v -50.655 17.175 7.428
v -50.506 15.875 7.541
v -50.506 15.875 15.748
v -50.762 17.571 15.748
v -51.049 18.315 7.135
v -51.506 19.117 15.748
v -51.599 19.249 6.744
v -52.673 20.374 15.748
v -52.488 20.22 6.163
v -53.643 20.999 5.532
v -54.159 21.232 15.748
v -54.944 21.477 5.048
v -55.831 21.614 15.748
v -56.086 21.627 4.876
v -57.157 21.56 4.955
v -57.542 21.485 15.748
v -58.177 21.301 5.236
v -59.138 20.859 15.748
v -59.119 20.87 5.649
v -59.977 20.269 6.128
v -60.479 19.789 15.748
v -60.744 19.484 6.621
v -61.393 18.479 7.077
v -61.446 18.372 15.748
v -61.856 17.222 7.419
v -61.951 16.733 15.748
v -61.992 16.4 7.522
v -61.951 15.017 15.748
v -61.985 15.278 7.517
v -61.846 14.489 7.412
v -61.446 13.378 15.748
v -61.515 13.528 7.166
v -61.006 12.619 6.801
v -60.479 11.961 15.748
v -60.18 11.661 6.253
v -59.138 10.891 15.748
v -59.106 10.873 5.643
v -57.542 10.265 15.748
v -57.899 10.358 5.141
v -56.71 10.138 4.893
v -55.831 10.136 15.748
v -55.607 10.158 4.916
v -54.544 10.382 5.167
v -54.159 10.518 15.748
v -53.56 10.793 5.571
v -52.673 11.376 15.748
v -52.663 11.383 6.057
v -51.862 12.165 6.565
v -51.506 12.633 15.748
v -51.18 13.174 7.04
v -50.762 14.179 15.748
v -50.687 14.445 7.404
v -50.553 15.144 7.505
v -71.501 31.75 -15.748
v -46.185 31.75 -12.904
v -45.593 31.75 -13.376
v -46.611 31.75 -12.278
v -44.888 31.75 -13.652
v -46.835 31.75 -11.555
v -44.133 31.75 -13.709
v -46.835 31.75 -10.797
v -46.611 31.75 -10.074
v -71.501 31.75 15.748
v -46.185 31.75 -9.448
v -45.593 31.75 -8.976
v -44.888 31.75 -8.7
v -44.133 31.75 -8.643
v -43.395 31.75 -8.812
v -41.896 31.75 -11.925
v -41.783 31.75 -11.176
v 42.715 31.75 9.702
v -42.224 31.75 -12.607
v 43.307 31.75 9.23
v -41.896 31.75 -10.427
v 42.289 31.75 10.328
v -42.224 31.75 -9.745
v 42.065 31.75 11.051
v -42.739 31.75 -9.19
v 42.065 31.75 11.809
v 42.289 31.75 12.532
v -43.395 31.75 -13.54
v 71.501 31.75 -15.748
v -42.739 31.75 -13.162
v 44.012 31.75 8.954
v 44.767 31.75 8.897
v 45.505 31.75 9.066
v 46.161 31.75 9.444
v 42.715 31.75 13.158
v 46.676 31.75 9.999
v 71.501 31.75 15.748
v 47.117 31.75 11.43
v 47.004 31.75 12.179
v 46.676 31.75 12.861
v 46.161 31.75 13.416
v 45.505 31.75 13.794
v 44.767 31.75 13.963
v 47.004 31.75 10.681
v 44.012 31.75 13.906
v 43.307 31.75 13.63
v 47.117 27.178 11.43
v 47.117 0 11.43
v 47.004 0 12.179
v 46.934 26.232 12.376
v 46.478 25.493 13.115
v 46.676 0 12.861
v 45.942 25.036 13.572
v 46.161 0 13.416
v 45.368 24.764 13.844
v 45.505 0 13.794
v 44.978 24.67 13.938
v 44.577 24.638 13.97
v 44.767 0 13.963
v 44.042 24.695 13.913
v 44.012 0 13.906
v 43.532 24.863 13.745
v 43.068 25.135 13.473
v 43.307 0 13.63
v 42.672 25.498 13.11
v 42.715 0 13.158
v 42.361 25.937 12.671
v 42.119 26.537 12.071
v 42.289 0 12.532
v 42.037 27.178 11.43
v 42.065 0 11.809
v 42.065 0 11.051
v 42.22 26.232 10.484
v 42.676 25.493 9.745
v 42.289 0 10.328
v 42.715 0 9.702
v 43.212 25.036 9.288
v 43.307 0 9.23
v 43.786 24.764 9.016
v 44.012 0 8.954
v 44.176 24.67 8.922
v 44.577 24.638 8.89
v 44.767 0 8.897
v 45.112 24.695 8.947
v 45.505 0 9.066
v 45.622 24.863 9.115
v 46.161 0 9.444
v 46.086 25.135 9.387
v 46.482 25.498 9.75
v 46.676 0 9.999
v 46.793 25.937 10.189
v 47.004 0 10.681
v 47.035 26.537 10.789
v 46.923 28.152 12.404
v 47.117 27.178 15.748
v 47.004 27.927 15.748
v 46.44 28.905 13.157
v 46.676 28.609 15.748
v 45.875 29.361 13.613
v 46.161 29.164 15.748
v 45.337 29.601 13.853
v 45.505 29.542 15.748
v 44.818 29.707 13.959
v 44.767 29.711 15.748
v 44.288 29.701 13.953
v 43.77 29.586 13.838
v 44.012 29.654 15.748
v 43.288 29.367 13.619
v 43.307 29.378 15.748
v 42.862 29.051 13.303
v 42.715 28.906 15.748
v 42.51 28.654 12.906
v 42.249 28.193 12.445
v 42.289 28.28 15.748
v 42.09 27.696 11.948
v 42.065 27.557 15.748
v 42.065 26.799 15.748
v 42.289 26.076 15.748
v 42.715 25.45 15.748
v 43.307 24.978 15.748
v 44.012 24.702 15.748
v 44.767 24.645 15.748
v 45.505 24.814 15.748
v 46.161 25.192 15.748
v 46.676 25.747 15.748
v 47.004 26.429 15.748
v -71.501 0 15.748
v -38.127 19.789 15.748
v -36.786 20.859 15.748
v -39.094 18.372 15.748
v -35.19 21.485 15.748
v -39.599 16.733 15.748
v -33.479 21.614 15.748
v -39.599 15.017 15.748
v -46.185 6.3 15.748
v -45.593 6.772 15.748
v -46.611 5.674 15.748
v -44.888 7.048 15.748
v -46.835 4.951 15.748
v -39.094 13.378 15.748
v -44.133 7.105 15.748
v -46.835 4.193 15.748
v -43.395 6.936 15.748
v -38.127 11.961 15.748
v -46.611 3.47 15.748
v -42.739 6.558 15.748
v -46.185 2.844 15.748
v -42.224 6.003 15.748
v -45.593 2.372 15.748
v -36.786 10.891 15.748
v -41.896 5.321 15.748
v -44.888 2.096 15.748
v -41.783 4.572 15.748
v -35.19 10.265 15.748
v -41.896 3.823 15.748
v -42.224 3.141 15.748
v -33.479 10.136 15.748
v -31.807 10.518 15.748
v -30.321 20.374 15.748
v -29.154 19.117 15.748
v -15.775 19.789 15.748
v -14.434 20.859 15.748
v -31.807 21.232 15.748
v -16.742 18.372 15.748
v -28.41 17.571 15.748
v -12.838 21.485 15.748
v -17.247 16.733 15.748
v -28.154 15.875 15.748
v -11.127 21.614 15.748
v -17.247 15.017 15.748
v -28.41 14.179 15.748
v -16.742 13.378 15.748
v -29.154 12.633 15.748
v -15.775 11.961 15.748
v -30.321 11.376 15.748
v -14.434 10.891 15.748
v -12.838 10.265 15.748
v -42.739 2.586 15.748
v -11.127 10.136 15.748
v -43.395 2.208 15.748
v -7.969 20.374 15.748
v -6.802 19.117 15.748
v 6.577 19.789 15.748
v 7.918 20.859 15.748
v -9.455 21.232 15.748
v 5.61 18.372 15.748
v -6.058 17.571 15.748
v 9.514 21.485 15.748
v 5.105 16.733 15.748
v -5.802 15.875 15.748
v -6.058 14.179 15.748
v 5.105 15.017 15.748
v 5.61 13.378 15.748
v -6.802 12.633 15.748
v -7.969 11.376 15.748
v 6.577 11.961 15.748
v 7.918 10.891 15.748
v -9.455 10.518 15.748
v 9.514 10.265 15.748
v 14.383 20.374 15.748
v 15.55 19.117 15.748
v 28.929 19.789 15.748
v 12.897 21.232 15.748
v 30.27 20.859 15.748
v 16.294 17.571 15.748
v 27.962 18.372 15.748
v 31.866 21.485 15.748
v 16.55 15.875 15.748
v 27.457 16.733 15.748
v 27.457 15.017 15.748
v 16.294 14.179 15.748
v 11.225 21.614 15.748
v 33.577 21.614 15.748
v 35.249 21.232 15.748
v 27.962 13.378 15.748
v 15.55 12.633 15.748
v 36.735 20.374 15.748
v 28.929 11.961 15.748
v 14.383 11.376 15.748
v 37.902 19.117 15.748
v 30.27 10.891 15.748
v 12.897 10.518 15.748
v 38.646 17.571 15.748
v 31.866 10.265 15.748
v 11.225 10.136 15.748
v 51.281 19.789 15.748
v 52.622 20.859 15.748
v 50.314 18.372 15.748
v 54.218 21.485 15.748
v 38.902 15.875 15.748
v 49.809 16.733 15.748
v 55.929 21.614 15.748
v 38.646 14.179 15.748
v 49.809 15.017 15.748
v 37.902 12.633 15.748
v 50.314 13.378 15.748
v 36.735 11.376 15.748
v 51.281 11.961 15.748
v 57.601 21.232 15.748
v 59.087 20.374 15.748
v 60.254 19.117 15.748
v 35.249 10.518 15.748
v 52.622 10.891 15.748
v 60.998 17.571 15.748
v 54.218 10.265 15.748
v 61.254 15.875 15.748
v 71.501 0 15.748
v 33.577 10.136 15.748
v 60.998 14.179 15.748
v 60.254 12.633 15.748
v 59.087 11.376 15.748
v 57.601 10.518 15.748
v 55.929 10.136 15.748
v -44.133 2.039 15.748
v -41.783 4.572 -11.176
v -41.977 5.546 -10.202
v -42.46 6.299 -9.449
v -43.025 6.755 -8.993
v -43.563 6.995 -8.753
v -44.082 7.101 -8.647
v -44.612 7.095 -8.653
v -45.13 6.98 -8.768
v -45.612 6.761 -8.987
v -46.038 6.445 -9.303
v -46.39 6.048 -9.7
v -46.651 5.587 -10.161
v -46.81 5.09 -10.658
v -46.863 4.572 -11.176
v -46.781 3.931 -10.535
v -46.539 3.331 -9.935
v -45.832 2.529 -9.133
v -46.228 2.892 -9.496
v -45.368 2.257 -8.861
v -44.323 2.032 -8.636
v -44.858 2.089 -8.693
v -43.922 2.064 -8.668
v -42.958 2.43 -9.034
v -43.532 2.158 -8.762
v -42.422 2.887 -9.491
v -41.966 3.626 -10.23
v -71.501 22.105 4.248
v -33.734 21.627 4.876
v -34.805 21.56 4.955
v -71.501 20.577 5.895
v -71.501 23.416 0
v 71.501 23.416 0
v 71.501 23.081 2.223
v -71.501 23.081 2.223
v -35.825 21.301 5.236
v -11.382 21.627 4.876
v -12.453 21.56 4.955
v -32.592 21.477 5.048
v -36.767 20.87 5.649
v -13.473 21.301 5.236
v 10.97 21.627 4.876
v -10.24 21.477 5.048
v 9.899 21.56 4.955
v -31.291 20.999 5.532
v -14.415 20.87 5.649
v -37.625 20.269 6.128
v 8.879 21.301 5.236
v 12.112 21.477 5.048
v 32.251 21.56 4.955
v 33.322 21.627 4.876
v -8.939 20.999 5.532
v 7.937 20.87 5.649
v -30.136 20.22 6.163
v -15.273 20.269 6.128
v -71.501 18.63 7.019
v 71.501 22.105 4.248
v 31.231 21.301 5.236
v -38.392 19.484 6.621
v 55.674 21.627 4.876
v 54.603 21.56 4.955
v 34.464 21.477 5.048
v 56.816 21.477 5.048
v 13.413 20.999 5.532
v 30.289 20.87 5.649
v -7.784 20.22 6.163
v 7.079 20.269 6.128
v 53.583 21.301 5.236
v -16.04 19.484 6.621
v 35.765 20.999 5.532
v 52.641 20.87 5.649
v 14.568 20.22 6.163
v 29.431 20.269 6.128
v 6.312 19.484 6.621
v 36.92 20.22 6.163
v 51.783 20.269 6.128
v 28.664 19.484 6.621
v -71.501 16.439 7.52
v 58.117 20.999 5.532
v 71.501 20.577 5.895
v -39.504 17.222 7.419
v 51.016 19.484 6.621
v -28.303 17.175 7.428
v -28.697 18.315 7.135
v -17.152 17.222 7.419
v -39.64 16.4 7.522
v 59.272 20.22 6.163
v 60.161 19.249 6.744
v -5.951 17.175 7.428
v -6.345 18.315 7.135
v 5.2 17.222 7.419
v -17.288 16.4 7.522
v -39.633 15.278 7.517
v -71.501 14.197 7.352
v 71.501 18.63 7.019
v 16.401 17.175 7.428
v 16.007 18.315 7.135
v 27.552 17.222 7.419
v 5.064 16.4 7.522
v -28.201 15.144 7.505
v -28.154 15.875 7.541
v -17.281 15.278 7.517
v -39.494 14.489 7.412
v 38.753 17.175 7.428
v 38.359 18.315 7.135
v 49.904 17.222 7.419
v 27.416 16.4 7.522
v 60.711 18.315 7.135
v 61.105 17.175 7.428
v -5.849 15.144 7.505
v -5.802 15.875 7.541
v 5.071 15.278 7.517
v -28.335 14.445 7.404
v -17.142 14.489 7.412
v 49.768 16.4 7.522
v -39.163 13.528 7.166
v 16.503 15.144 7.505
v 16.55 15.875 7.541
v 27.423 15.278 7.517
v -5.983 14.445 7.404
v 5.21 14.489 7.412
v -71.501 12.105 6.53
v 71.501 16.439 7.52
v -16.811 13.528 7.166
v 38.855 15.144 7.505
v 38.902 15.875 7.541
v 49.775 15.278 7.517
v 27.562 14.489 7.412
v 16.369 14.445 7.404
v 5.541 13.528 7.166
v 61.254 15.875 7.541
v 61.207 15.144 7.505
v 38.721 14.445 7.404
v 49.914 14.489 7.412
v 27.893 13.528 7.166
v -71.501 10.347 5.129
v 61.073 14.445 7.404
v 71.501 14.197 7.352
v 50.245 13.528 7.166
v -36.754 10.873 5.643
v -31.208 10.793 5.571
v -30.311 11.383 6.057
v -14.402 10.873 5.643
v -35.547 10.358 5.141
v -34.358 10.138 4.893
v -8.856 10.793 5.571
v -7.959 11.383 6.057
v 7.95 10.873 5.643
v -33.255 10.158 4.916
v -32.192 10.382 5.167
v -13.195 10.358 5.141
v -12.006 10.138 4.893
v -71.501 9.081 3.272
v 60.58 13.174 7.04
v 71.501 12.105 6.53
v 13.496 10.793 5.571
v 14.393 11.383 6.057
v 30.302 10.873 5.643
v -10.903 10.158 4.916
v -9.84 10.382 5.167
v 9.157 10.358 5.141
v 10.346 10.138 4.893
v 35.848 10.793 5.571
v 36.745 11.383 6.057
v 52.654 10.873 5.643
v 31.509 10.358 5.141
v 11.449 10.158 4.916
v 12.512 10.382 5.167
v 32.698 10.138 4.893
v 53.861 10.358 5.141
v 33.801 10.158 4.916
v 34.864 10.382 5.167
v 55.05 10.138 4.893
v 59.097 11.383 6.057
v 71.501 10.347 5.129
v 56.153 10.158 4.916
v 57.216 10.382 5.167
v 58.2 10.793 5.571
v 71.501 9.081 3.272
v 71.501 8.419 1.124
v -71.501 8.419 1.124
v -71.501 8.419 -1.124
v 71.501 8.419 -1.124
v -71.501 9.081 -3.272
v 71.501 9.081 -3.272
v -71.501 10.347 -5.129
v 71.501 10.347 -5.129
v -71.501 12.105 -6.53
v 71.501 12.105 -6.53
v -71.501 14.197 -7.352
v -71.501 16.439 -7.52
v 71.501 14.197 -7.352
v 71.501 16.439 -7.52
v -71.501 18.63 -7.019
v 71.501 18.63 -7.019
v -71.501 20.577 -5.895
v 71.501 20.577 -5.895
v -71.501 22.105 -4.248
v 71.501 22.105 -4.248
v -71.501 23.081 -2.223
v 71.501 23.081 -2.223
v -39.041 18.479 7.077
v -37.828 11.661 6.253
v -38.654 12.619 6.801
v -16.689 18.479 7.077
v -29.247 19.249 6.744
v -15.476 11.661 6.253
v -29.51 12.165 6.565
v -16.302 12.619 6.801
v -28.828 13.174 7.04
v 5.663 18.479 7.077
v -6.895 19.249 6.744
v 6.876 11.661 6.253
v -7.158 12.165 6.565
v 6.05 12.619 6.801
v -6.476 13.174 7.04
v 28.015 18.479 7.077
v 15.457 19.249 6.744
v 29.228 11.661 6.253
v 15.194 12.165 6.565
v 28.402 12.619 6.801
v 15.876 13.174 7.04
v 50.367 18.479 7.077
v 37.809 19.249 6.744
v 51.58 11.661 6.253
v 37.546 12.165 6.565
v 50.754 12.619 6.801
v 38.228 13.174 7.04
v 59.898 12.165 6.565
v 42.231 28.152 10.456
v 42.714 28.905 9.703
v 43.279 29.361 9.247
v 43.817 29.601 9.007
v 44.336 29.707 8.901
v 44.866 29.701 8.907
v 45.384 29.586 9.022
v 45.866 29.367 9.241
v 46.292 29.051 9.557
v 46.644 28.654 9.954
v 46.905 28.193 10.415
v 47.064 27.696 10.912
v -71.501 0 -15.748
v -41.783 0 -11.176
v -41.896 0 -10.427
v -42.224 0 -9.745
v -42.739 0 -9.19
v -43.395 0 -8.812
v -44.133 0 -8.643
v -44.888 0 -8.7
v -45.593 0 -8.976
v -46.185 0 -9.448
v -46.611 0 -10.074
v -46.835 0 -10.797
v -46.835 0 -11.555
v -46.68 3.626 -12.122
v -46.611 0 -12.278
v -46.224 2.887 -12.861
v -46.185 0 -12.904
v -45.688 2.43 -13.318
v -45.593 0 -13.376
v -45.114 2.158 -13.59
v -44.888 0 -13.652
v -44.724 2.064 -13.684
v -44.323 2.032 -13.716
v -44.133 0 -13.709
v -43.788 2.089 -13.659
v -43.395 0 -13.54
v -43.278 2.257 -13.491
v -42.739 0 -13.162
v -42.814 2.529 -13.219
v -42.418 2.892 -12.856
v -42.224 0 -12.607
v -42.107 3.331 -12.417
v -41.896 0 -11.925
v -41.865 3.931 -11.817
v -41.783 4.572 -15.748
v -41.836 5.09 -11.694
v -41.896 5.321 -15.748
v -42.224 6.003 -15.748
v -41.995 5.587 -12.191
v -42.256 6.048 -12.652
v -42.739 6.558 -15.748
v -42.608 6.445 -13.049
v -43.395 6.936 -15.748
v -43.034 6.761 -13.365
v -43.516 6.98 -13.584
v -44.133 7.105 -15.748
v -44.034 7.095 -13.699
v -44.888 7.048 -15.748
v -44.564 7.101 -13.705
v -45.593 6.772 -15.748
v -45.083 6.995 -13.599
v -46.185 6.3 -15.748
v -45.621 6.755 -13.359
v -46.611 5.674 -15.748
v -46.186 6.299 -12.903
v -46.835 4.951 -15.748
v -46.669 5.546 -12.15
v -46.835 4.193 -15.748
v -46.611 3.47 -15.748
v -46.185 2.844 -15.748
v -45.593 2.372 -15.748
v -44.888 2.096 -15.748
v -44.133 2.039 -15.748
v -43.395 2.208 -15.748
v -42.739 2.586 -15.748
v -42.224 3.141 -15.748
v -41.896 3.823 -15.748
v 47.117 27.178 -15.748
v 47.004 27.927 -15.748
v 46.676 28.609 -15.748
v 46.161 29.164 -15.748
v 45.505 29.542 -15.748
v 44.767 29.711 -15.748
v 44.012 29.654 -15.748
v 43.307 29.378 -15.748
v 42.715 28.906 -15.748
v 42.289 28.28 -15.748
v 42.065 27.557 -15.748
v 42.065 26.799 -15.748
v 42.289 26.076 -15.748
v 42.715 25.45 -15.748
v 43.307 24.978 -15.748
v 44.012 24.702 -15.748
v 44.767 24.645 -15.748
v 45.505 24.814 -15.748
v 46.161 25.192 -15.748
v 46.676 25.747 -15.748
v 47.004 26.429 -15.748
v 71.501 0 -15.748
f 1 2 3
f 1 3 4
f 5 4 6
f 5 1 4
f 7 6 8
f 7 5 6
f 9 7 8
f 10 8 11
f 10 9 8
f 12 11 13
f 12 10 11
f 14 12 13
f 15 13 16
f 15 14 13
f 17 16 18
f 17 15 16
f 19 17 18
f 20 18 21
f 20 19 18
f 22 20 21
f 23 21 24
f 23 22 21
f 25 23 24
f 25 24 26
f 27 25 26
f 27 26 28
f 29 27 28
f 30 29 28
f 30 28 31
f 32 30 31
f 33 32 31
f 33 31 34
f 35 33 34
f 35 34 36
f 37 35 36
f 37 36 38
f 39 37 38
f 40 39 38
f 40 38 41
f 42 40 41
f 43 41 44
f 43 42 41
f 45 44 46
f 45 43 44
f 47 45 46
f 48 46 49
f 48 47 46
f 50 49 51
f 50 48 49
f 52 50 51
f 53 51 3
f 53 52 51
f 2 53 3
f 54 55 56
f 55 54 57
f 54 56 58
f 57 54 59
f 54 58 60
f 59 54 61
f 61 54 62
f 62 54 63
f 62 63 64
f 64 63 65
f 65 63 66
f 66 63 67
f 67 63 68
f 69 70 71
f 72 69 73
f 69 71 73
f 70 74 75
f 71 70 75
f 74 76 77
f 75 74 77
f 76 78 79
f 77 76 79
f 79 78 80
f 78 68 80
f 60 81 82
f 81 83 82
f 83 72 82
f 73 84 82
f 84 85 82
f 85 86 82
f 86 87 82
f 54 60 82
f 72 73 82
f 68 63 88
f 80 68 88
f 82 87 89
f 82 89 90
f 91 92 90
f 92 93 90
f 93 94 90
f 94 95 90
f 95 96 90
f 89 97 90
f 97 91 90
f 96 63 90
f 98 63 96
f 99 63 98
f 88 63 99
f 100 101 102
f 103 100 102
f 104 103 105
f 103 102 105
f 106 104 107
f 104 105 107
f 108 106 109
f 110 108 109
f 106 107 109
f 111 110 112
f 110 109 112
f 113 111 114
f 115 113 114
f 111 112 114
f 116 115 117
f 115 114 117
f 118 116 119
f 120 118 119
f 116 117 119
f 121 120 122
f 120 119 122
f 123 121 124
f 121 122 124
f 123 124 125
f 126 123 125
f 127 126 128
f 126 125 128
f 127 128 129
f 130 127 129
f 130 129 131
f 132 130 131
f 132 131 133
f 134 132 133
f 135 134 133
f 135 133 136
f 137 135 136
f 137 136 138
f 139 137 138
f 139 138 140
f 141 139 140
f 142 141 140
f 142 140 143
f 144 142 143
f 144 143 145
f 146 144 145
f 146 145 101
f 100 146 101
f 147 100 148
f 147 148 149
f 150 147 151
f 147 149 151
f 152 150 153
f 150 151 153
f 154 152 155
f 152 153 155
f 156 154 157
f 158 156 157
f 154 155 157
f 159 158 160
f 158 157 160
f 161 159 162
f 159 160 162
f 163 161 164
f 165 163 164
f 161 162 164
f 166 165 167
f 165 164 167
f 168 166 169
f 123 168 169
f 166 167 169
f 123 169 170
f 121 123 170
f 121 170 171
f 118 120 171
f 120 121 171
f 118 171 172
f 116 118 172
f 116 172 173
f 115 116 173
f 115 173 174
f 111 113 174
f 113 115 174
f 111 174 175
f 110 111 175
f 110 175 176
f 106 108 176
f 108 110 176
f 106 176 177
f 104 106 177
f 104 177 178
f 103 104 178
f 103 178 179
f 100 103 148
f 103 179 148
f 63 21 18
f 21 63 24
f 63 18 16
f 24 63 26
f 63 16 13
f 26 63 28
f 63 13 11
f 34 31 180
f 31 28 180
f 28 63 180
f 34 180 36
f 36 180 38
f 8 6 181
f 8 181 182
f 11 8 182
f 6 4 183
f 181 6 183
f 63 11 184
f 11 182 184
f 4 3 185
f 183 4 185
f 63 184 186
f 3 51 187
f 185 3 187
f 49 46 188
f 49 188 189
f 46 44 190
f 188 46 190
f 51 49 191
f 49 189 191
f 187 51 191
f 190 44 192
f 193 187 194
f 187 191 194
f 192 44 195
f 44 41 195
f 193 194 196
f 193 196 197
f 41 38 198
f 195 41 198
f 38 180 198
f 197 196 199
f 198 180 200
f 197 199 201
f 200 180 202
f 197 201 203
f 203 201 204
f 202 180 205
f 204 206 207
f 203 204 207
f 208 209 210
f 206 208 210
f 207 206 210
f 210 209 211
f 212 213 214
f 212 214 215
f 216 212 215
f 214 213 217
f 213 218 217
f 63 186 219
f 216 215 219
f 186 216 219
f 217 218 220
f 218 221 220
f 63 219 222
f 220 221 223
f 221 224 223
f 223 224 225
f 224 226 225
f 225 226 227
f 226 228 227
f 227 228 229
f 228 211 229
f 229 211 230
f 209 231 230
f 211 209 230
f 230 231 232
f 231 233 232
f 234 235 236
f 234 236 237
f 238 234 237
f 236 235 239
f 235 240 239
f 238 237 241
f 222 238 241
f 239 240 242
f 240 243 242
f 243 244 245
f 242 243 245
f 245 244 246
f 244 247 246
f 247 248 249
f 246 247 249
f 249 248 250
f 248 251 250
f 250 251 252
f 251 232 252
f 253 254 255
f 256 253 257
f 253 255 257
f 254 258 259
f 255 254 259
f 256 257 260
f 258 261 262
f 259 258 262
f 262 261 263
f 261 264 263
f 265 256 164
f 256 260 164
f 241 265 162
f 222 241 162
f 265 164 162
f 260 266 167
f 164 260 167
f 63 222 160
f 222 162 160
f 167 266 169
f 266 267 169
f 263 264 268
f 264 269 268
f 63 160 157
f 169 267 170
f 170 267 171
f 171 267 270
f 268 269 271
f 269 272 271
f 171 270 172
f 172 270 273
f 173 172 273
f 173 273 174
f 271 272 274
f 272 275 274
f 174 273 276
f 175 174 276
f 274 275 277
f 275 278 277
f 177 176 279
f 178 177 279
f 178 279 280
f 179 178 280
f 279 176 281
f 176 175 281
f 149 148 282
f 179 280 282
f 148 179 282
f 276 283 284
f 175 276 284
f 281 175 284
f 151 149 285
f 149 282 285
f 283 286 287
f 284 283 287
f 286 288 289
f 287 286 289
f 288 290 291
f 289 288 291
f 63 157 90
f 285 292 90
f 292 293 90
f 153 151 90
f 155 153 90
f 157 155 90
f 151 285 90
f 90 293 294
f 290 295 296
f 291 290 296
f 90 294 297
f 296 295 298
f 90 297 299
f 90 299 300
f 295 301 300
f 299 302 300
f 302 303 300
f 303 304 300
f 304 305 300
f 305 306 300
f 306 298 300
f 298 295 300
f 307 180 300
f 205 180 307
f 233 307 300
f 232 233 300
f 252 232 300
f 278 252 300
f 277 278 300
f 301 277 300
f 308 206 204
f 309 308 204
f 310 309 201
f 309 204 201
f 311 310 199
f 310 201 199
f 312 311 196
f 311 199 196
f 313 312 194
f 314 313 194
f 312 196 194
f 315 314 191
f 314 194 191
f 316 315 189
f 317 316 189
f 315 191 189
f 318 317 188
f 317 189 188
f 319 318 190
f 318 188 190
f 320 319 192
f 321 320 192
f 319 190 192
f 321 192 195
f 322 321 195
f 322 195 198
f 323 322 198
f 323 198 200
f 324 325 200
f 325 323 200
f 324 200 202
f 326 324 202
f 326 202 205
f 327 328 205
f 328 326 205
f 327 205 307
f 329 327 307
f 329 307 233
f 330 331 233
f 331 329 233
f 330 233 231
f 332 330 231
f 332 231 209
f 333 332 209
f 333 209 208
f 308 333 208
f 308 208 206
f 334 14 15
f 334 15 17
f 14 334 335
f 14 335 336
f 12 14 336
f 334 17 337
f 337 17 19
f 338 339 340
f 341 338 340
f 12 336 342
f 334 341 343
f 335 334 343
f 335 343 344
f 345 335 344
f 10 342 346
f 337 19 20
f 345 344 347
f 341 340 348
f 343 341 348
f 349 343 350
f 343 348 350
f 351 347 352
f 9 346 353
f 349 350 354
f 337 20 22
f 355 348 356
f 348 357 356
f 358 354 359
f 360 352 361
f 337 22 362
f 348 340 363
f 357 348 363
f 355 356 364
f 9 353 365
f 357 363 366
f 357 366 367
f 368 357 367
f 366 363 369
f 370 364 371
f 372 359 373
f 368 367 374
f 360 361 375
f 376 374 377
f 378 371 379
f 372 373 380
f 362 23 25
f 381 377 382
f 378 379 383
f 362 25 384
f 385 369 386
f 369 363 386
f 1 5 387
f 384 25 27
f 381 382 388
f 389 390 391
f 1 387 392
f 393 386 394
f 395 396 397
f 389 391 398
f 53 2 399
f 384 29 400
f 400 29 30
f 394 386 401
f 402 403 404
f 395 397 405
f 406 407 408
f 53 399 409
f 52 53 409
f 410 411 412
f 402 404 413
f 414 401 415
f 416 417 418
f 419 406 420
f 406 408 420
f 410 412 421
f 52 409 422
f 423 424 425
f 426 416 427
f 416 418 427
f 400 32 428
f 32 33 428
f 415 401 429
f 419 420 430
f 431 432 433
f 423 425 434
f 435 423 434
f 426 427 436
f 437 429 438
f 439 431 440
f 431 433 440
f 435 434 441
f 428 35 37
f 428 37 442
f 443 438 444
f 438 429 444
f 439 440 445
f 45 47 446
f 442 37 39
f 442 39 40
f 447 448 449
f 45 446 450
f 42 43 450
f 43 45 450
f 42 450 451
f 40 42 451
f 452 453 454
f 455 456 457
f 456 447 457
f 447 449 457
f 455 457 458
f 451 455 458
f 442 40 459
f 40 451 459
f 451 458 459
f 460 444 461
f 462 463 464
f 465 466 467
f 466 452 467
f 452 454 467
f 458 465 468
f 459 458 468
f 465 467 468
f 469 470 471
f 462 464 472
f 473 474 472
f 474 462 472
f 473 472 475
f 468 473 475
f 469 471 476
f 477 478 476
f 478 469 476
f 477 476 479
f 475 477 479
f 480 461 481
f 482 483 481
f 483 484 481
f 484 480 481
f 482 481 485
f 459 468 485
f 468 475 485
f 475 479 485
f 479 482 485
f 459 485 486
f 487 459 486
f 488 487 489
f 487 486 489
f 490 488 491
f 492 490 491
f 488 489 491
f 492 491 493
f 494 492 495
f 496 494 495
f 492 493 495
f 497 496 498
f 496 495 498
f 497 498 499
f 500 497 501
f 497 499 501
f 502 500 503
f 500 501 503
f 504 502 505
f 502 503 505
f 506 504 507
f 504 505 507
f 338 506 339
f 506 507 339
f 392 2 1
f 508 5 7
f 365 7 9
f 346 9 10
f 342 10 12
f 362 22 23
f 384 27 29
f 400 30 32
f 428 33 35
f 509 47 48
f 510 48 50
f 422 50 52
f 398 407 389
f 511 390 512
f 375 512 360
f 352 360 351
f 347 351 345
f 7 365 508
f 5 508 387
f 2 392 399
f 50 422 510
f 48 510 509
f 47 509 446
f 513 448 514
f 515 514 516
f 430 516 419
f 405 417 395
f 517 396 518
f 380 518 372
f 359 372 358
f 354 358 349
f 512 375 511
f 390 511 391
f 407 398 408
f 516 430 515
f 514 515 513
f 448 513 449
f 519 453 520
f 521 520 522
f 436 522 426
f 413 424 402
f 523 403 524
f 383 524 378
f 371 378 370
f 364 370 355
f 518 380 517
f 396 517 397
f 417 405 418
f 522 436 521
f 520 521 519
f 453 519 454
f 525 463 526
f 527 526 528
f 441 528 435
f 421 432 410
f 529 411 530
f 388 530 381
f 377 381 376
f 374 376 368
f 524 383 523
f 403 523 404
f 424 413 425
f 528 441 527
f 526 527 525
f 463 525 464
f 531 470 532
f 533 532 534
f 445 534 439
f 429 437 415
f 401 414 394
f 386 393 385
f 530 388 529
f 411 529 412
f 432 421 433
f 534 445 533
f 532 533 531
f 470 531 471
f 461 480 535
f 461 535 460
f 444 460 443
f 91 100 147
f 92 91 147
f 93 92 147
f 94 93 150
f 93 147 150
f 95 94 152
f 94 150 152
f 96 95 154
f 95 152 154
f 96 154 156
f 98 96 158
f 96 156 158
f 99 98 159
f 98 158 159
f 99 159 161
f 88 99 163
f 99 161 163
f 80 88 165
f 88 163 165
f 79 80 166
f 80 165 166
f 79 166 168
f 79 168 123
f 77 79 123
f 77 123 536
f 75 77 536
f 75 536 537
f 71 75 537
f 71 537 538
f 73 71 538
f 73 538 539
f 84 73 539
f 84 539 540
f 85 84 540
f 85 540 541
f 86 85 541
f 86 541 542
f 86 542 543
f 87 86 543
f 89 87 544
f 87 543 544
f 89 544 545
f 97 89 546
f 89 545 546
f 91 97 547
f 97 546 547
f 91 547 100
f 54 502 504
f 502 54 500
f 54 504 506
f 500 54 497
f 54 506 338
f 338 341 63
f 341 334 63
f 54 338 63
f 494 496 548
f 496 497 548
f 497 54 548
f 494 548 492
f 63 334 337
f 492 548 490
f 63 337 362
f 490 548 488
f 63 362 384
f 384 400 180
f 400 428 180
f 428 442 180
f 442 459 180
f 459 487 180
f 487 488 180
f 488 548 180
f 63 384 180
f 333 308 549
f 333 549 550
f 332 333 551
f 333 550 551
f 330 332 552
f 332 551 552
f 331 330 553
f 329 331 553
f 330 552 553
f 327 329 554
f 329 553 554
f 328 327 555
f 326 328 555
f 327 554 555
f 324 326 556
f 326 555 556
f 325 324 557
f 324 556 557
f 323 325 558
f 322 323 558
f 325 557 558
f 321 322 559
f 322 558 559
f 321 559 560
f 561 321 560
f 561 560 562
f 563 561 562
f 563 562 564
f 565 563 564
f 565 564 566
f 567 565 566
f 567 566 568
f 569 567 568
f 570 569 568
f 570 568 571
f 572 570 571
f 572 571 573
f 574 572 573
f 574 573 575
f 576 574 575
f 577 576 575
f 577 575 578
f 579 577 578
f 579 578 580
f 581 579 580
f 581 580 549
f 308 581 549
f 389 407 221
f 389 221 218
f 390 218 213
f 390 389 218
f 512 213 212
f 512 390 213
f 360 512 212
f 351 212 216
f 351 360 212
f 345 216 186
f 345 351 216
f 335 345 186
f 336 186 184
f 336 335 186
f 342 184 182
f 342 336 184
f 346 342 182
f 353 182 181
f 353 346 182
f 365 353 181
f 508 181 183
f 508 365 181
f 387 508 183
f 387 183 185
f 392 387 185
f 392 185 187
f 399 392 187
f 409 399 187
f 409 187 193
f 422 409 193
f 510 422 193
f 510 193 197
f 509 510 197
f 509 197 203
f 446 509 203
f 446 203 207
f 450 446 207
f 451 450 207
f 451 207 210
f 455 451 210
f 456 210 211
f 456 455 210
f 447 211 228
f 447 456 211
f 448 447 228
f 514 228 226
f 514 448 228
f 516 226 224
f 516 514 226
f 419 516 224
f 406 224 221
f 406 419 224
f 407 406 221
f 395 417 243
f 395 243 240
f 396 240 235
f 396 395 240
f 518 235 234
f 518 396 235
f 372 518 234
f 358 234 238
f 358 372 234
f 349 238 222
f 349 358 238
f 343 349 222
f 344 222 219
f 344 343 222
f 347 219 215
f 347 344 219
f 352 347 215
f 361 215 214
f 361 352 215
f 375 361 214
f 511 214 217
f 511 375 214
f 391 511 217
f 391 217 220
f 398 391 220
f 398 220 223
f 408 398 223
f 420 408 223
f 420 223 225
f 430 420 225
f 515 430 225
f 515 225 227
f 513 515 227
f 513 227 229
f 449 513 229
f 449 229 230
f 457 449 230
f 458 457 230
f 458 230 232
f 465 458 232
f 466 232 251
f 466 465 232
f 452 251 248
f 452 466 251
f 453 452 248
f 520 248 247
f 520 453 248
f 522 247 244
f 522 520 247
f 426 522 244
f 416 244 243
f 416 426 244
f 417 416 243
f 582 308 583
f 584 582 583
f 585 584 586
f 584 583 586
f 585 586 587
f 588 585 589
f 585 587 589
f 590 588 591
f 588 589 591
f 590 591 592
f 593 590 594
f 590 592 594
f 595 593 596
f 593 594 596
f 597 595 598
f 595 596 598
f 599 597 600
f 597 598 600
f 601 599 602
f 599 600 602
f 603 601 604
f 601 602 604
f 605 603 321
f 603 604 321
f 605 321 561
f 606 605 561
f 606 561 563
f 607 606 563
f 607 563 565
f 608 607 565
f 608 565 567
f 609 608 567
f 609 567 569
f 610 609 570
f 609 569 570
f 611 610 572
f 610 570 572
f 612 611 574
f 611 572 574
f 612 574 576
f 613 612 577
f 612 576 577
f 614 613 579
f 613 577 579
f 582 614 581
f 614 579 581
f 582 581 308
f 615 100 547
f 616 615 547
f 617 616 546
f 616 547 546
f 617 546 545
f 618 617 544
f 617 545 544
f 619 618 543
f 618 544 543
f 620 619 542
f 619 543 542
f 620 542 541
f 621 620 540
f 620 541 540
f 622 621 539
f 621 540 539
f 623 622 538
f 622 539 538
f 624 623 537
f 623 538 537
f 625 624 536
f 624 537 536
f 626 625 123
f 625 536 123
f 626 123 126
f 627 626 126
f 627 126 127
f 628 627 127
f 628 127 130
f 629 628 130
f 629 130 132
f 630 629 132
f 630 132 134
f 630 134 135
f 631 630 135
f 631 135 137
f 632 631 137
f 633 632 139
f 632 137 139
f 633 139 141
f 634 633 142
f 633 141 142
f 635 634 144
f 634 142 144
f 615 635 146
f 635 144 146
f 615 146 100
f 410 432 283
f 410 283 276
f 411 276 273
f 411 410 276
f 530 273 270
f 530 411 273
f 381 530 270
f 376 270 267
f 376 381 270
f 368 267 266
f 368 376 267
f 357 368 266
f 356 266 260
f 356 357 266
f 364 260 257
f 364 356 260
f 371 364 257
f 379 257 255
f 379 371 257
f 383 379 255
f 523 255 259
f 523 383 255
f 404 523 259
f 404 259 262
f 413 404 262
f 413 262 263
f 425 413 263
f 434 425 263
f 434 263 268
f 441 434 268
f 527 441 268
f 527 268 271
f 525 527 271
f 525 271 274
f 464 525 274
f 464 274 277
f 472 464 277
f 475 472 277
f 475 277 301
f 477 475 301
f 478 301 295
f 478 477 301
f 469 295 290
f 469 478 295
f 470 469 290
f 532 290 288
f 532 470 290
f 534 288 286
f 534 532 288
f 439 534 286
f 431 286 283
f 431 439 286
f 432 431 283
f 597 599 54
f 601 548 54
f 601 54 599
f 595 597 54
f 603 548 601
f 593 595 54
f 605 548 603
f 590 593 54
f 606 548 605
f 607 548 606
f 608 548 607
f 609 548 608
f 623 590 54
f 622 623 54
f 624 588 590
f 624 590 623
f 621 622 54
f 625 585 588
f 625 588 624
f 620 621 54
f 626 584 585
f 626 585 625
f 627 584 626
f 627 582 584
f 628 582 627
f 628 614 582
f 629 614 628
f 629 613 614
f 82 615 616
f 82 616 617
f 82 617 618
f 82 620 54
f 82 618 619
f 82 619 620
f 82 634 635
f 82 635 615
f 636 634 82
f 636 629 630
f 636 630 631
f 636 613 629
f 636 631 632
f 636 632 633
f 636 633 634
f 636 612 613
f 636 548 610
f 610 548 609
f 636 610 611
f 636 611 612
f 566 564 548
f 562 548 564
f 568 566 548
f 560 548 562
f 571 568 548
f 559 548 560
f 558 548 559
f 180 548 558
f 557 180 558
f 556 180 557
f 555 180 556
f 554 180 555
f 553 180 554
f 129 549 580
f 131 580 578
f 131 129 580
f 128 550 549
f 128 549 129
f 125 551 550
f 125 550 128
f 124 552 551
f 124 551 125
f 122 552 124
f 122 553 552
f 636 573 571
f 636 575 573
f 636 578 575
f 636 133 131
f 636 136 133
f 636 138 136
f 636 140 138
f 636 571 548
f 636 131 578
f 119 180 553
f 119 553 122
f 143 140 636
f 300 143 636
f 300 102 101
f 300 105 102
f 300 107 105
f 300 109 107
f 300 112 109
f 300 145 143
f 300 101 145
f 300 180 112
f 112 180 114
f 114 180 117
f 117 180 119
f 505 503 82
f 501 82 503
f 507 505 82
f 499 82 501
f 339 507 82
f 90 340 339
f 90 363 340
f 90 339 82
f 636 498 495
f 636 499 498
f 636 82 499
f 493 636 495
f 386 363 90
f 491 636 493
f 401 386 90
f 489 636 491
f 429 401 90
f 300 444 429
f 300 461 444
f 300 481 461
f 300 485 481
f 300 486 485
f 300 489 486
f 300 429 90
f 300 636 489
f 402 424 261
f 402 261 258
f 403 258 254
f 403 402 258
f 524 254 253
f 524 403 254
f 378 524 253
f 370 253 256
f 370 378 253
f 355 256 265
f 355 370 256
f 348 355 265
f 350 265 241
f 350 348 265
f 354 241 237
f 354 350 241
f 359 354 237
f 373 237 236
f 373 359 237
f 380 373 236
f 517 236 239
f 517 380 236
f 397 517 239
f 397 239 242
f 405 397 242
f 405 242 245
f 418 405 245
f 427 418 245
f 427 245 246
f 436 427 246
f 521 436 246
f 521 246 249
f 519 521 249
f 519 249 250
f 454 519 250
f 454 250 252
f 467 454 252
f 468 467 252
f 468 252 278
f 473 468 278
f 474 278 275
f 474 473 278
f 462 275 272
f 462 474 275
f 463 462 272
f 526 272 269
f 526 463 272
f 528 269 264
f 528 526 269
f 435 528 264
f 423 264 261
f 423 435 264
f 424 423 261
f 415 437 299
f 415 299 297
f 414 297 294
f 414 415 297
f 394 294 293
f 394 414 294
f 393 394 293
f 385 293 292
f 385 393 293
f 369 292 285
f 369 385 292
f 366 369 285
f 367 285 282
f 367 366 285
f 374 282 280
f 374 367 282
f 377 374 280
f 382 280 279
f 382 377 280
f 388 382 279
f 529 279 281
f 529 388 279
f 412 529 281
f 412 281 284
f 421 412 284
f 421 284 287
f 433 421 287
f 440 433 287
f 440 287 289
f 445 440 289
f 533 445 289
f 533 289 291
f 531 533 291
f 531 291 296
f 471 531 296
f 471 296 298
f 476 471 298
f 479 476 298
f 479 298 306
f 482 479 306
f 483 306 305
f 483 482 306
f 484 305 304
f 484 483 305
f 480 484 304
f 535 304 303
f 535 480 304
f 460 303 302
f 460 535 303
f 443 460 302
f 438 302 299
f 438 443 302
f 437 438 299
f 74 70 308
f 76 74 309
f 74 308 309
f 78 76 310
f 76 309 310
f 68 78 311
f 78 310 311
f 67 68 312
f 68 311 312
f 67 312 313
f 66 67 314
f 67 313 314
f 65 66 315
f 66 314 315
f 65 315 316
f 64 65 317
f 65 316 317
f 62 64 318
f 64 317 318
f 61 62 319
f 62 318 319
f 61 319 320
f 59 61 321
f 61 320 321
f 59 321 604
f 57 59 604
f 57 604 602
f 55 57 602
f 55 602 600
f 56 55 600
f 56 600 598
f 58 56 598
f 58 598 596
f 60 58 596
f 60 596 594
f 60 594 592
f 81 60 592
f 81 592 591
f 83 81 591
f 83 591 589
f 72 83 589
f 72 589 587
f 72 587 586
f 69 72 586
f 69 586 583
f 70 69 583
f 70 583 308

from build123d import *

# Parameters (mm, degrees)
F0_W     = 143.002
F0_H     = 31.496
F1_DEPTH = 31.75
F2_R     = 5.754688
F3_DEPTH = 15.875
F4_R     = 7.540625
F5_DEPTH = 143.003
F6_R     = 2.54
F7_DEPTH = 31.751
F8_R     = 2.54
F9_DEPTH = 31.497


with BuildPart() as f1:
    # F0 (on Front) → F1 (new body)
    with BuildSketch(Plane.XZ):
        Rectangle(F0_W, F0_H)
    extrude(amount=-F1_DEPTH)

    # F2 (on Top) → F3 (cut)
    with BuildSketch(Plane.XY):
        with Locations((-56.261, 15.875)):
            Circle(F2_R)
        with Locations((-33.909, 15.875)):
            Circle(F2_R)
        with Locations((-11.557, 15.875)):
            Circle(F2_R)
        with Locations((10.795, 15.875)):
            Circle(F2_R)
        with Locations((33.147, 15.875)):
            Circle(F2_R)
        with Locations((55.499, 15.875)):
            Circle(F2_R)
    extrude(amount=F3_DEPTH, mode=Mode.SUBTRACT)

    # F4 (on face) → F5 (cut, through all)
    with BuildSketch(Plane.YZ.offset(71.501)):
        with Locations((15.875, 0)):
            Circle(F4_R)
    extrude(amount=-F5_DEPTH, mode=Mode.SUBTRACT)

    # F6 (on face) → F7 (cut, through all)
    with BuildSketch(Plane.XZ):
        with Locations((-44.323, -11.176)):
            Circle(F6_R)
        with Locations((44.577, 11.43)):
            Circle(F6_R)
    extrude(amount=-F7_DEPTH, mode=Mode.SUBTRACT)

    # F8 (on face) → F9 (cut, through all)
    with BuildSketch(Plane.XY.offset(15.748)):
        with Locations((44.577, 27.178)):
            Circle(F8_R)
        with Locations((-44.323, 4.572)):
            Circle(F8_R)
    extrude(amount=-F9_DEPTH, mode=Mode.SUBTRACT)


solid = f1.part
